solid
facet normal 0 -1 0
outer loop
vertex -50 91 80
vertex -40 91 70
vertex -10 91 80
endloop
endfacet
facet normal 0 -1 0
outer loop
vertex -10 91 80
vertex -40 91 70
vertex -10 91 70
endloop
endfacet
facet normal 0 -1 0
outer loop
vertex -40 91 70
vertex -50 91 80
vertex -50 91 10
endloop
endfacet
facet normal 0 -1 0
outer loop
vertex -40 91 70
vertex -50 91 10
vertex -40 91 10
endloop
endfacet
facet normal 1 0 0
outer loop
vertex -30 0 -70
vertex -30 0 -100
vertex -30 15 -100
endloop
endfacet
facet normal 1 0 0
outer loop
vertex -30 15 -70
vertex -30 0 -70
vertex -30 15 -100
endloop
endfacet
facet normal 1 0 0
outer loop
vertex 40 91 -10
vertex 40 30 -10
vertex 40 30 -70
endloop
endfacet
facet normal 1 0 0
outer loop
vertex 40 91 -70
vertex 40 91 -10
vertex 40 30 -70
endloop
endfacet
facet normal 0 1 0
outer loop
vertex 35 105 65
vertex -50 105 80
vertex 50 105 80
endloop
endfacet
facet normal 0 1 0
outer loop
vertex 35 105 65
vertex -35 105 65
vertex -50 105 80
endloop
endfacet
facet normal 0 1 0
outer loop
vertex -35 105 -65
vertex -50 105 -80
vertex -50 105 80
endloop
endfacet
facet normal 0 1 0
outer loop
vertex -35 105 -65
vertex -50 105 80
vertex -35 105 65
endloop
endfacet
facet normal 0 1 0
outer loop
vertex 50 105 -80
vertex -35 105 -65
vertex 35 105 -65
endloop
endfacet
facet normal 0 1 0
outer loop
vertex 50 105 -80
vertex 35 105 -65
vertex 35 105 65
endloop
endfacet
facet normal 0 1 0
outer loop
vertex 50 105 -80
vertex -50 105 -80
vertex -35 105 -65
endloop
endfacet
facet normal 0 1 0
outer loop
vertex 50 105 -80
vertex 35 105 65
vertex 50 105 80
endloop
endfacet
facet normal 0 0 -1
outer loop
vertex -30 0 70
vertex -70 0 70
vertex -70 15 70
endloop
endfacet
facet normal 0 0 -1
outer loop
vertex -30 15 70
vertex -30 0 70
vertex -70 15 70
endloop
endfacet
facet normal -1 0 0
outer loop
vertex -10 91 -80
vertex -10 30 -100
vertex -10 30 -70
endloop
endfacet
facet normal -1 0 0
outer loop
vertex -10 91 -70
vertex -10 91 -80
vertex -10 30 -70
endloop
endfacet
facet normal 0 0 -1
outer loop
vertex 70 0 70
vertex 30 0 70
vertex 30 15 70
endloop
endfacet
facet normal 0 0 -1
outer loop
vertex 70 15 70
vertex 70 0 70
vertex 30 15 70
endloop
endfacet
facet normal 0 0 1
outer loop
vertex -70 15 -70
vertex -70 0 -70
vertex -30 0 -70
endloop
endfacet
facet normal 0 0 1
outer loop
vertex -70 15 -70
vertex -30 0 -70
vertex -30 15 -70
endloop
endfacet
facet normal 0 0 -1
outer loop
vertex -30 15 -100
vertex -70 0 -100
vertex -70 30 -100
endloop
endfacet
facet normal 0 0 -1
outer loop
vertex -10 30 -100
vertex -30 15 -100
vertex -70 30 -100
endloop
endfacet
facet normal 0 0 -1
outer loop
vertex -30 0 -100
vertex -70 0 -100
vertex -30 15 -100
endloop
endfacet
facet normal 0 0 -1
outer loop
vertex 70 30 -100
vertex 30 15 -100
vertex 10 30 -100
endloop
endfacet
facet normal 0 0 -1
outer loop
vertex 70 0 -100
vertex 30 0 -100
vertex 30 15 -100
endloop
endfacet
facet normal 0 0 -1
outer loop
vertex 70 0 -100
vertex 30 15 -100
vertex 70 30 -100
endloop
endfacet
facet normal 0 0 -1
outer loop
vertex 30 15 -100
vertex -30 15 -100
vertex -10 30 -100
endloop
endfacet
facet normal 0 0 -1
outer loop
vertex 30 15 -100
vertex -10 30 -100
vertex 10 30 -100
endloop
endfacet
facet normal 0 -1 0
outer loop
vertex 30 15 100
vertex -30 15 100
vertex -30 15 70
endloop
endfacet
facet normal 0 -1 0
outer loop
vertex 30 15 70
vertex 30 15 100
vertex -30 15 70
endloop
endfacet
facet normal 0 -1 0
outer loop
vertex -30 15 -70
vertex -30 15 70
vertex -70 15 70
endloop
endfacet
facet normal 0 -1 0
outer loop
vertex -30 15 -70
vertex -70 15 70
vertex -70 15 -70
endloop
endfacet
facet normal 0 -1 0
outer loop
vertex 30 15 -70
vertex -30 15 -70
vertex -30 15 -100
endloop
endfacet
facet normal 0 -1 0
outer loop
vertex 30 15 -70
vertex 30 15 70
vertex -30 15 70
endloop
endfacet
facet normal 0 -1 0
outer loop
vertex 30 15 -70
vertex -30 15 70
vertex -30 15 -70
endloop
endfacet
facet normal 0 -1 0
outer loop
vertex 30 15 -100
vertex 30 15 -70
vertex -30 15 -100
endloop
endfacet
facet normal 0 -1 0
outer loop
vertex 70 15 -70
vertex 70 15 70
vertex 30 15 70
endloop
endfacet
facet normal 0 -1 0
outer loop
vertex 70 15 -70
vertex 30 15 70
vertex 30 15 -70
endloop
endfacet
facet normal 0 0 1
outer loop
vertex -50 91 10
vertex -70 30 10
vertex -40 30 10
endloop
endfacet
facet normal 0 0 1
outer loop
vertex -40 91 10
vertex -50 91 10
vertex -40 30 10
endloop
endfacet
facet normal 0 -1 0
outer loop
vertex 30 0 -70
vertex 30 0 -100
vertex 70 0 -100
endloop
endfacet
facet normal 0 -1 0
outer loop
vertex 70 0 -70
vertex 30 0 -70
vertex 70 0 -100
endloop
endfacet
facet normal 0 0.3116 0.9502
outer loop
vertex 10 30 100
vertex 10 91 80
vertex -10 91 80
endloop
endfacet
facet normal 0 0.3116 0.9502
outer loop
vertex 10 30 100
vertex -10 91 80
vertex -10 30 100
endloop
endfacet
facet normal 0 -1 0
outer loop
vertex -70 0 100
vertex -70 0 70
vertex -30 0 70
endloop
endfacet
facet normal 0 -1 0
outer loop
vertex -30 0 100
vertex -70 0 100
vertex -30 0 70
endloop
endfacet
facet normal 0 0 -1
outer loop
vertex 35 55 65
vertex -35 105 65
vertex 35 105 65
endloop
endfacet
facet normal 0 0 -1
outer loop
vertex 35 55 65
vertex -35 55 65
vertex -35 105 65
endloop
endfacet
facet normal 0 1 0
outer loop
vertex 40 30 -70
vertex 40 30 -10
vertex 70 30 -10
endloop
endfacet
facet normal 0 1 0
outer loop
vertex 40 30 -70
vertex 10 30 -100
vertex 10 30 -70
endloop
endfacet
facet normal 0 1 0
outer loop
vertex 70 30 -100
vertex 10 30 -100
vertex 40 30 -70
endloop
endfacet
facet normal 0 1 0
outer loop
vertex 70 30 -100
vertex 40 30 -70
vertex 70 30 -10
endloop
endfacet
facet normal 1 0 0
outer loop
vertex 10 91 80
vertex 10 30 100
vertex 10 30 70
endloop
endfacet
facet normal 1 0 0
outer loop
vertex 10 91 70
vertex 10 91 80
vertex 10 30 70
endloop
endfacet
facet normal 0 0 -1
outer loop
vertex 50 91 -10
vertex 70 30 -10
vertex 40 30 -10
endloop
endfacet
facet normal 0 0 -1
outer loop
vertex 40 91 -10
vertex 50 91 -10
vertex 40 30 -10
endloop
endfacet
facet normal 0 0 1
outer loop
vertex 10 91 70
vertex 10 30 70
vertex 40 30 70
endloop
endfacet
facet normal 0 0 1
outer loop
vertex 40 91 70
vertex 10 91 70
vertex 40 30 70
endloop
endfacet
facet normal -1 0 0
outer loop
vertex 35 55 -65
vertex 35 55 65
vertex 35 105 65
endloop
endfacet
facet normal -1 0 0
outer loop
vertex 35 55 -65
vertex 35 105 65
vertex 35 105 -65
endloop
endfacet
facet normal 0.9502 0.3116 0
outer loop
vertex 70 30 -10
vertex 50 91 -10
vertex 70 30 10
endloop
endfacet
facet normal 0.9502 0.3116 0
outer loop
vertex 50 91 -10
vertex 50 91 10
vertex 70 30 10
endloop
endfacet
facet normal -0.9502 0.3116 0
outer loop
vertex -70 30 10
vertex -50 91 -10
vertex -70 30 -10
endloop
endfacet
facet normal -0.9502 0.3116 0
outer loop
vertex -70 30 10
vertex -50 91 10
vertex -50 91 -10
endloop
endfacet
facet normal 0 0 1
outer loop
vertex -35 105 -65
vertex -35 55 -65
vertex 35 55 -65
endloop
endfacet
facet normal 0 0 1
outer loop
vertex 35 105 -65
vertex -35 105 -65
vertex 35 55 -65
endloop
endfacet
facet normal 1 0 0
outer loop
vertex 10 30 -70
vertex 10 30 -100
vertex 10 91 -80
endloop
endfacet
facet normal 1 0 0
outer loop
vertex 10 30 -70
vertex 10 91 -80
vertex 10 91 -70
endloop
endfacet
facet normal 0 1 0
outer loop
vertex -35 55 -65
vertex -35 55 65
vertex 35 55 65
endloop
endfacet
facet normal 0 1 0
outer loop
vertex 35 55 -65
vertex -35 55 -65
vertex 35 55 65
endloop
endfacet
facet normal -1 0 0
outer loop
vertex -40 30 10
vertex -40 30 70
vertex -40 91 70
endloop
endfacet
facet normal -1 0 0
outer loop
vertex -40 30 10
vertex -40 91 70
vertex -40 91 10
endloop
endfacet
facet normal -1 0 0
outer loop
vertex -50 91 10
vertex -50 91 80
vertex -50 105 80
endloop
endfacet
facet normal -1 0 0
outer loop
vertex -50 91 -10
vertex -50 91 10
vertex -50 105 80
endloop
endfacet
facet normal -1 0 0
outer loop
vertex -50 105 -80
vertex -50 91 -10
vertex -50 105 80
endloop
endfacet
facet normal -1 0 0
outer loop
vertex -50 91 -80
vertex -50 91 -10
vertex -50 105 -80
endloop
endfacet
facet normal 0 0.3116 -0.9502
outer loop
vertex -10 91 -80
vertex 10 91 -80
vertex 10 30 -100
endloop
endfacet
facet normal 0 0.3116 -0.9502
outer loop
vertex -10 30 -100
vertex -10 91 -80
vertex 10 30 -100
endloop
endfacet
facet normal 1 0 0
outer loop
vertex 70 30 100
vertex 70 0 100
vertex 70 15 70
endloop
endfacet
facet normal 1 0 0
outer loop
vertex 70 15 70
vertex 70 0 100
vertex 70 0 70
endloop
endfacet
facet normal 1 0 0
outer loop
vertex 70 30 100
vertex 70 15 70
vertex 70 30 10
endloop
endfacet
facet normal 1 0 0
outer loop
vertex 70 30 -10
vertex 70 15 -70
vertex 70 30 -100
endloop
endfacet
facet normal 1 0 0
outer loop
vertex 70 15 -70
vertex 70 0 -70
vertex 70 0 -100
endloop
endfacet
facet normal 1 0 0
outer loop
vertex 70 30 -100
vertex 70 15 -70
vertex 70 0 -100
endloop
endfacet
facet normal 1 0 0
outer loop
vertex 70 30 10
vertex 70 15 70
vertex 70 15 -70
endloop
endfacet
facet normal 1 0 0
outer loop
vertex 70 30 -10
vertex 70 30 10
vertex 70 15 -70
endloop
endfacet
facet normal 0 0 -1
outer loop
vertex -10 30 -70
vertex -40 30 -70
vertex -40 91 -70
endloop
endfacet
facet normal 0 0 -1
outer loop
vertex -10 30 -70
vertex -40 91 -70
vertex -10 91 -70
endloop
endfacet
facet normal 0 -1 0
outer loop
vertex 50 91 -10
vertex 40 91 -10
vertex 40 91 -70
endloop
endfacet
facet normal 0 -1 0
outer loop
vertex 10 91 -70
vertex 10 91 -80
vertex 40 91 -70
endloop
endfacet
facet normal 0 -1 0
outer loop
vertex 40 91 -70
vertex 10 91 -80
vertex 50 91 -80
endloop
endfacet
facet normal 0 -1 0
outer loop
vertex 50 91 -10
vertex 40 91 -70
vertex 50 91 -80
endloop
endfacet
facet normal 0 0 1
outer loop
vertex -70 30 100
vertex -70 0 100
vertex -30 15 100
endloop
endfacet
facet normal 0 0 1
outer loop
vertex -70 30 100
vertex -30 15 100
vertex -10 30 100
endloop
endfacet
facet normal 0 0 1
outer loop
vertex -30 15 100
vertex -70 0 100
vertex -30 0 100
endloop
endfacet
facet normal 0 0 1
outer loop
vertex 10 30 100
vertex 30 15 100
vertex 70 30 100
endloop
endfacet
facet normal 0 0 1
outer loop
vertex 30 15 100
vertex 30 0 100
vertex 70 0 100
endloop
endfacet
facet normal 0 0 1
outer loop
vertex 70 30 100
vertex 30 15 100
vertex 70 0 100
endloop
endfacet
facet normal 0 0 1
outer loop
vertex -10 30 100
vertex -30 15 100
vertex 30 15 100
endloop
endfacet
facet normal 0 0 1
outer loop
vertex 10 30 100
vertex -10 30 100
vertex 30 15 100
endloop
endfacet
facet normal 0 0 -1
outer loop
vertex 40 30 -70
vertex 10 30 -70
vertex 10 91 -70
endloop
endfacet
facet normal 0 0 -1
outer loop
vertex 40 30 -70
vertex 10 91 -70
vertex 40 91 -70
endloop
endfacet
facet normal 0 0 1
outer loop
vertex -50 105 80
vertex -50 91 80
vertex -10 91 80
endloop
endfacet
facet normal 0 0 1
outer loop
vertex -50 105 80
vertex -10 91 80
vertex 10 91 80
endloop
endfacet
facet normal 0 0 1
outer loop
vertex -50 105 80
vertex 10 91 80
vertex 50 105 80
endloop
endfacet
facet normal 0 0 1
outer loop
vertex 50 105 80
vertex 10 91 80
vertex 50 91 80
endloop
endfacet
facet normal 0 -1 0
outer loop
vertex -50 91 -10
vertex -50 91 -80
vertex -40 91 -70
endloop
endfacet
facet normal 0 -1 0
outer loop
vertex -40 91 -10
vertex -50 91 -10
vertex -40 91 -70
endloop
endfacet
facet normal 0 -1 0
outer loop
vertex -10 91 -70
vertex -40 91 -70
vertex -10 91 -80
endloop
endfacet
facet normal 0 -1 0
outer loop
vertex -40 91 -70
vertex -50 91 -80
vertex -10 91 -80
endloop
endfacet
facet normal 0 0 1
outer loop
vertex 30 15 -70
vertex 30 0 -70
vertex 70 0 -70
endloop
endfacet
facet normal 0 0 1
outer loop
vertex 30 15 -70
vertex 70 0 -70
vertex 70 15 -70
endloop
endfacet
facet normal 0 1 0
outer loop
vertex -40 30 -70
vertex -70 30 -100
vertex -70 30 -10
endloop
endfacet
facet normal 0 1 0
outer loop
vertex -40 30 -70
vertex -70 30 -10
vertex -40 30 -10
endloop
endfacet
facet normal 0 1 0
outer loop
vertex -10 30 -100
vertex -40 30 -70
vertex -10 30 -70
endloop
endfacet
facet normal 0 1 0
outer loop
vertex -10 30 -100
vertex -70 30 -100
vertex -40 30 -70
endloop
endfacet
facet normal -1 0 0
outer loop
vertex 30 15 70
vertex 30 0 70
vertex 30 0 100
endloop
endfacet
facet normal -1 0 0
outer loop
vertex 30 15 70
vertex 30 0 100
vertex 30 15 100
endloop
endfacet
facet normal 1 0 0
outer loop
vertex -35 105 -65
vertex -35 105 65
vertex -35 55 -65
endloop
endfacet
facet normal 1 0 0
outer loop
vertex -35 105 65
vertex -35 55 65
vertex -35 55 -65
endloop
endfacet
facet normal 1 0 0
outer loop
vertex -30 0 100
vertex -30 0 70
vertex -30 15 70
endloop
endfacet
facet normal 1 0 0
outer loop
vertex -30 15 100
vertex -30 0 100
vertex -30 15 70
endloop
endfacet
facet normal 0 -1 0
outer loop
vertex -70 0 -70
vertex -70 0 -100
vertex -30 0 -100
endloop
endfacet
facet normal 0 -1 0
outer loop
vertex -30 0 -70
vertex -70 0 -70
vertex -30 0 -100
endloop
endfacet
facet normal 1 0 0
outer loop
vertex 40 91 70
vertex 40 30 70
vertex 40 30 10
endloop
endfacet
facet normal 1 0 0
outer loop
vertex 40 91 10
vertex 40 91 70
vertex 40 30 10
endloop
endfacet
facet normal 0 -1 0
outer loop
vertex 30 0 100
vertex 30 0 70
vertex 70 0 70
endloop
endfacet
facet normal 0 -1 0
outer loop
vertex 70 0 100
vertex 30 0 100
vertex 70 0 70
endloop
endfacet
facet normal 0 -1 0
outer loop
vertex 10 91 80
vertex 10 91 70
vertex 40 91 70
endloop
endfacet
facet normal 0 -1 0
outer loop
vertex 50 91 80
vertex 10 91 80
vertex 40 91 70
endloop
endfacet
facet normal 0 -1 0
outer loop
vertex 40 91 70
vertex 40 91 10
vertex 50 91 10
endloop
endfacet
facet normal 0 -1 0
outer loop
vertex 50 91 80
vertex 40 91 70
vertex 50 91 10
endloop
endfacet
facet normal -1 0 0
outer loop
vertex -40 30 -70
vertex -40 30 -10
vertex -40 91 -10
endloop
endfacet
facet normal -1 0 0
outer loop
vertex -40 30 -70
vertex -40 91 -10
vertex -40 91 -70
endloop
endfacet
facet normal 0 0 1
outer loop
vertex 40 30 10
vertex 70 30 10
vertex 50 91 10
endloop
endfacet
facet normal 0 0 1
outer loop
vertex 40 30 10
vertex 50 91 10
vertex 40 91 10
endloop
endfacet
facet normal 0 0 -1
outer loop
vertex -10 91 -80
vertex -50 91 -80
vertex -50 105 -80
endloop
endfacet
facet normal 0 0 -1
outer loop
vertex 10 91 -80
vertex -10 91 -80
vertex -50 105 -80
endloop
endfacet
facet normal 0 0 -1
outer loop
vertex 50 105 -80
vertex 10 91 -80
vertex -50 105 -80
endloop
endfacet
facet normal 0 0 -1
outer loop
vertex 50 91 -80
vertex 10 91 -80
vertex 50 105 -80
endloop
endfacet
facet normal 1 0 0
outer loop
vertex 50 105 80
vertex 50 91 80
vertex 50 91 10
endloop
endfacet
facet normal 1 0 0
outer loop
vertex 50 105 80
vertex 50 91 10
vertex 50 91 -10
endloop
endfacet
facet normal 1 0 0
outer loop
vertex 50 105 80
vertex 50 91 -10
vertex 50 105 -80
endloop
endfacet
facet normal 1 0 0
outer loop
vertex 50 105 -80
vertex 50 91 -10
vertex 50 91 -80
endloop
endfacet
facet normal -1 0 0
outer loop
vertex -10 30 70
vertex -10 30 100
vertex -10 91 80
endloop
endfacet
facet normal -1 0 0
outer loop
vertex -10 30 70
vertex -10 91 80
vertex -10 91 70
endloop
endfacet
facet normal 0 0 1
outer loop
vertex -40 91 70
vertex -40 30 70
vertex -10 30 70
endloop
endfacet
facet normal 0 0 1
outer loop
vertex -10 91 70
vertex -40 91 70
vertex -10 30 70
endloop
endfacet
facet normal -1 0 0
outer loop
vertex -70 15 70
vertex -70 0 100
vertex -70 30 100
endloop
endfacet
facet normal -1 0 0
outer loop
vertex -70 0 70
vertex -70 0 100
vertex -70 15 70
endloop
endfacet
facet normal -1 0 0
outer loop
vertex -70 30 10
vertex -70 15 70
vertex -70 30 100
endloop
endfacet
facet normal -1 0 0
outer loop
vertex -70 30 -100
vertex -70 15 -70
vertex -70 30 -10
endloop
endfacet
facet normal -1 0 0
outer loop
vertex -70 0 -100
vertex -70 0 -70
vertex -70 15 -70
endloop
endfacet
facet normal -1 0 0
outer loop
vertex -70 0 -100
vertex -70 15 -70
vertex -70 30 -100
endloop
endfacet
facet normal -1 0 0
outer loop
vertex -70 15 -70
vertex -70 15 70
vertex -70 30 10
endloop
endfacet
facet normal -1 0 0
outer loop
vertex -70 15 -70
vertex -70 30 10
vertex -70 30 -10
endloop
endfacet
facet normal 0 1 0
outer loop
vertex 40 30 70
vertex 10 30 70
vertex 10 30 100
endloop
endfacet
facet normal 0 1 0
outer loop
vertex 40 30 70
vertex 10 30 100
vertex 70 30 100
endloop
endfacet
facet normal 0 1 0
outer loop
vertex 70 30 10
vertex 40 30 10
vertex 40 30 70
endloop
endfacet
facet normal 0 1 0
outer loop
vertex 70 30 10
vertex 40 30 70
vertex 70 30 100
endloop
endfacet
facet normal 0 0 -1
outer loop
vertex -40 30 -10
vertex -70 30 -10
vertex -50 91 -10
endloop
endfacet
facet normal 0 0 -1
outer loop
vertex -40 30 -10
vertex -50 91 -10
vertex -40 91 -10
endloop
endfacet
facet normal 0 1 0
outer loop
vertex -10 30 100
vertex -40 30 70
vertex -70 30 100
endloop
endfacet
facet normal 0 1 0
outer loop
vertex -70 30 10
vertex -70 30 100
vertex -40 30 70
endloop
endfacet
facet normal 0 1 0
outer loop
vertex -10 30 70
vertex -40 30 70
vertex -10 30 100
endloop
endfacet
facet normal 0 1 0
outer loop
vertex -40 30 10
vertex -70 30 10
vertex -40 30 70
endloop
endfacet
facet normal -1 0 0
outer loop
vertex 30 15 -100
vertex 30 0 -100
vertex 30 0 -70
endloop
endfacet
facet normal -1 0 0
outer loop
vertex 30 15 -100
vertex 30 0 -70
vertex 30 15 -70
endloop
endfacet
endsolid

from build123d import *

# Parameters (mm, degrees)
SKETCH1_W           = 140
SKETCH1_H           = 200
BOSS_EXTRUDE1_DEPTH = 30
SKETCH2_W           = 140
SKETCH2_H           = 15
CUT_EXTRUDE1_DEPTH  = 175.642491966
SKETCH3_W           = 60
SKETCH3_H           = 15
CUT_EXTRUDE3_DEPTH  = 215.00934559
SKETCH4_W           = 80
SKETCH4_H           = 140
BOSS_EXTRUDE3_DEPTH = 61
SKETCH5_W           = 100
SKETCH5_H           = 160
SKETCH5_W_2         = 70
SKETCH5_H_2         = 130
BOSS_EXTRUDE4_DEPTH = 14
SKETCH7_W           = 70
SKETCH7_H           = 130
CUT_EXTRUDE4_DEPTH  = 36
BOSS_EXTRUDE5_DEPTH = 10
BOSS_EXTRUDE6_DEPTH = 10


with BuildPart() as part:
    # Sketch1 → Boss-Extrude1 (new body)
    with BuildSketch(Plane(origin=(0, 0, 0), x_dir=(1, 0, 0), z_dir=(0, 1, 0))):
        Rectangle(SKETCH1_W, SKETCH1_H)
    extrude(amount=BOSS_EXTRUDE1_DEPTH)

    # Sketch2 → Cut-Extrude1 (cut, through all)
    with BuildSketch(Plane(origin=(70, 0, 0), x_dir=(0, 0, -1), z_dir=(1, 0, 0))):
        with Locations((0, 7.5)):
            Rectangle(SKETCH2_W, SKETCH2_H)
    extrude(amount=-CUT_EXTRUDE1_DEPTH, mode=Mode.SUBTRACT)

    # Sketch3 → Cut-Extrude3 (cut, through all)
    with BuildSketch(Plane.XY.offset(100)):
        with Locations((0, 7.5)):
            Rectangle(SKETCH3_W, SKETCH3_H)
    extrude(amount=-CUT_EXTRUDE3_DEPTH, mode=Mode.SUBTRACT)

    # Sketch4 → Boss-Extrude3 (add)
    with BuildSketch(Plane(origin=(0, 30, 0), x_dir=(1, 0, 0), z_dir=(0, 1, 0))):
        Rectangle(SKETCH4_W, SKETCH4_H)
    extrude(amount=BOSS_EXTRUDE3_DEPTH)

    # Sketch5 → Boss-Extrude4 (add)
    with BuildSketch(Plane(origin=(0, 91, 0), x_dir=(1, 0, 0), z_dir=(0, 1, 0))):
        Rectangle(SKETCH5_W, SKETCH5_H)
        Rectangle(SKETCH5_W_2, SKETCH5_H_2, mode=Mode.SUBTRACT)
    extrude(amount=BOSS_EXTRUDE4_DEPTH)

    # Sketch7 → Cut-Extrude4 (cut)
    with BuildSketch(Plane(origin=(0, 91, 0), x_dir=(1, 0, 0), z_dir=(0, 1, 0))):
        Rectangle(SKETCH7_W, SKETCH7_H)
    extrude(amount=-CUT_EXTRUDE4_DEPTH, mode=Mode.SUBTRACT)

    # Sketch9 → Boss-Extrude5 (add, symmetric)
    with BuildSketch(Plane.XY):
        Polygon((-50, 91), (-70, 30), (-39.979727261, 30), (-40, 91), align=None)
    boss_extrude5 = extrude(amount=BOSS_EXTRUDE5_DEPTH, both=True)

    # Mirror1: Boss-Extrude5 across plane
    add(boss_extrude5.mirror(Plane(origin=(0, 0, 0), x_dir=(0, 0, 1), z_dir=(1, 0, 0))))

    # Sketch10 → Boss-Extrude6 (add, symmetric)
    with BuildSketch(Plane(origin=(0, 0, 0), x_dir=(0, 0, -1), z_dir=(1, 0, 0))):
        Polygon((-70, 91), (-80, 91), (-100, 30), (-70, 30), align=None)
    boss_extrude6 = extrude(amount=BOSS_EXTRUDE6_DEPTH, both=True)

    # Mirror2: Boss-Extrude6 across plane
    add(boss_extrude6.mirror(Plane.XY))


solid = part.part
